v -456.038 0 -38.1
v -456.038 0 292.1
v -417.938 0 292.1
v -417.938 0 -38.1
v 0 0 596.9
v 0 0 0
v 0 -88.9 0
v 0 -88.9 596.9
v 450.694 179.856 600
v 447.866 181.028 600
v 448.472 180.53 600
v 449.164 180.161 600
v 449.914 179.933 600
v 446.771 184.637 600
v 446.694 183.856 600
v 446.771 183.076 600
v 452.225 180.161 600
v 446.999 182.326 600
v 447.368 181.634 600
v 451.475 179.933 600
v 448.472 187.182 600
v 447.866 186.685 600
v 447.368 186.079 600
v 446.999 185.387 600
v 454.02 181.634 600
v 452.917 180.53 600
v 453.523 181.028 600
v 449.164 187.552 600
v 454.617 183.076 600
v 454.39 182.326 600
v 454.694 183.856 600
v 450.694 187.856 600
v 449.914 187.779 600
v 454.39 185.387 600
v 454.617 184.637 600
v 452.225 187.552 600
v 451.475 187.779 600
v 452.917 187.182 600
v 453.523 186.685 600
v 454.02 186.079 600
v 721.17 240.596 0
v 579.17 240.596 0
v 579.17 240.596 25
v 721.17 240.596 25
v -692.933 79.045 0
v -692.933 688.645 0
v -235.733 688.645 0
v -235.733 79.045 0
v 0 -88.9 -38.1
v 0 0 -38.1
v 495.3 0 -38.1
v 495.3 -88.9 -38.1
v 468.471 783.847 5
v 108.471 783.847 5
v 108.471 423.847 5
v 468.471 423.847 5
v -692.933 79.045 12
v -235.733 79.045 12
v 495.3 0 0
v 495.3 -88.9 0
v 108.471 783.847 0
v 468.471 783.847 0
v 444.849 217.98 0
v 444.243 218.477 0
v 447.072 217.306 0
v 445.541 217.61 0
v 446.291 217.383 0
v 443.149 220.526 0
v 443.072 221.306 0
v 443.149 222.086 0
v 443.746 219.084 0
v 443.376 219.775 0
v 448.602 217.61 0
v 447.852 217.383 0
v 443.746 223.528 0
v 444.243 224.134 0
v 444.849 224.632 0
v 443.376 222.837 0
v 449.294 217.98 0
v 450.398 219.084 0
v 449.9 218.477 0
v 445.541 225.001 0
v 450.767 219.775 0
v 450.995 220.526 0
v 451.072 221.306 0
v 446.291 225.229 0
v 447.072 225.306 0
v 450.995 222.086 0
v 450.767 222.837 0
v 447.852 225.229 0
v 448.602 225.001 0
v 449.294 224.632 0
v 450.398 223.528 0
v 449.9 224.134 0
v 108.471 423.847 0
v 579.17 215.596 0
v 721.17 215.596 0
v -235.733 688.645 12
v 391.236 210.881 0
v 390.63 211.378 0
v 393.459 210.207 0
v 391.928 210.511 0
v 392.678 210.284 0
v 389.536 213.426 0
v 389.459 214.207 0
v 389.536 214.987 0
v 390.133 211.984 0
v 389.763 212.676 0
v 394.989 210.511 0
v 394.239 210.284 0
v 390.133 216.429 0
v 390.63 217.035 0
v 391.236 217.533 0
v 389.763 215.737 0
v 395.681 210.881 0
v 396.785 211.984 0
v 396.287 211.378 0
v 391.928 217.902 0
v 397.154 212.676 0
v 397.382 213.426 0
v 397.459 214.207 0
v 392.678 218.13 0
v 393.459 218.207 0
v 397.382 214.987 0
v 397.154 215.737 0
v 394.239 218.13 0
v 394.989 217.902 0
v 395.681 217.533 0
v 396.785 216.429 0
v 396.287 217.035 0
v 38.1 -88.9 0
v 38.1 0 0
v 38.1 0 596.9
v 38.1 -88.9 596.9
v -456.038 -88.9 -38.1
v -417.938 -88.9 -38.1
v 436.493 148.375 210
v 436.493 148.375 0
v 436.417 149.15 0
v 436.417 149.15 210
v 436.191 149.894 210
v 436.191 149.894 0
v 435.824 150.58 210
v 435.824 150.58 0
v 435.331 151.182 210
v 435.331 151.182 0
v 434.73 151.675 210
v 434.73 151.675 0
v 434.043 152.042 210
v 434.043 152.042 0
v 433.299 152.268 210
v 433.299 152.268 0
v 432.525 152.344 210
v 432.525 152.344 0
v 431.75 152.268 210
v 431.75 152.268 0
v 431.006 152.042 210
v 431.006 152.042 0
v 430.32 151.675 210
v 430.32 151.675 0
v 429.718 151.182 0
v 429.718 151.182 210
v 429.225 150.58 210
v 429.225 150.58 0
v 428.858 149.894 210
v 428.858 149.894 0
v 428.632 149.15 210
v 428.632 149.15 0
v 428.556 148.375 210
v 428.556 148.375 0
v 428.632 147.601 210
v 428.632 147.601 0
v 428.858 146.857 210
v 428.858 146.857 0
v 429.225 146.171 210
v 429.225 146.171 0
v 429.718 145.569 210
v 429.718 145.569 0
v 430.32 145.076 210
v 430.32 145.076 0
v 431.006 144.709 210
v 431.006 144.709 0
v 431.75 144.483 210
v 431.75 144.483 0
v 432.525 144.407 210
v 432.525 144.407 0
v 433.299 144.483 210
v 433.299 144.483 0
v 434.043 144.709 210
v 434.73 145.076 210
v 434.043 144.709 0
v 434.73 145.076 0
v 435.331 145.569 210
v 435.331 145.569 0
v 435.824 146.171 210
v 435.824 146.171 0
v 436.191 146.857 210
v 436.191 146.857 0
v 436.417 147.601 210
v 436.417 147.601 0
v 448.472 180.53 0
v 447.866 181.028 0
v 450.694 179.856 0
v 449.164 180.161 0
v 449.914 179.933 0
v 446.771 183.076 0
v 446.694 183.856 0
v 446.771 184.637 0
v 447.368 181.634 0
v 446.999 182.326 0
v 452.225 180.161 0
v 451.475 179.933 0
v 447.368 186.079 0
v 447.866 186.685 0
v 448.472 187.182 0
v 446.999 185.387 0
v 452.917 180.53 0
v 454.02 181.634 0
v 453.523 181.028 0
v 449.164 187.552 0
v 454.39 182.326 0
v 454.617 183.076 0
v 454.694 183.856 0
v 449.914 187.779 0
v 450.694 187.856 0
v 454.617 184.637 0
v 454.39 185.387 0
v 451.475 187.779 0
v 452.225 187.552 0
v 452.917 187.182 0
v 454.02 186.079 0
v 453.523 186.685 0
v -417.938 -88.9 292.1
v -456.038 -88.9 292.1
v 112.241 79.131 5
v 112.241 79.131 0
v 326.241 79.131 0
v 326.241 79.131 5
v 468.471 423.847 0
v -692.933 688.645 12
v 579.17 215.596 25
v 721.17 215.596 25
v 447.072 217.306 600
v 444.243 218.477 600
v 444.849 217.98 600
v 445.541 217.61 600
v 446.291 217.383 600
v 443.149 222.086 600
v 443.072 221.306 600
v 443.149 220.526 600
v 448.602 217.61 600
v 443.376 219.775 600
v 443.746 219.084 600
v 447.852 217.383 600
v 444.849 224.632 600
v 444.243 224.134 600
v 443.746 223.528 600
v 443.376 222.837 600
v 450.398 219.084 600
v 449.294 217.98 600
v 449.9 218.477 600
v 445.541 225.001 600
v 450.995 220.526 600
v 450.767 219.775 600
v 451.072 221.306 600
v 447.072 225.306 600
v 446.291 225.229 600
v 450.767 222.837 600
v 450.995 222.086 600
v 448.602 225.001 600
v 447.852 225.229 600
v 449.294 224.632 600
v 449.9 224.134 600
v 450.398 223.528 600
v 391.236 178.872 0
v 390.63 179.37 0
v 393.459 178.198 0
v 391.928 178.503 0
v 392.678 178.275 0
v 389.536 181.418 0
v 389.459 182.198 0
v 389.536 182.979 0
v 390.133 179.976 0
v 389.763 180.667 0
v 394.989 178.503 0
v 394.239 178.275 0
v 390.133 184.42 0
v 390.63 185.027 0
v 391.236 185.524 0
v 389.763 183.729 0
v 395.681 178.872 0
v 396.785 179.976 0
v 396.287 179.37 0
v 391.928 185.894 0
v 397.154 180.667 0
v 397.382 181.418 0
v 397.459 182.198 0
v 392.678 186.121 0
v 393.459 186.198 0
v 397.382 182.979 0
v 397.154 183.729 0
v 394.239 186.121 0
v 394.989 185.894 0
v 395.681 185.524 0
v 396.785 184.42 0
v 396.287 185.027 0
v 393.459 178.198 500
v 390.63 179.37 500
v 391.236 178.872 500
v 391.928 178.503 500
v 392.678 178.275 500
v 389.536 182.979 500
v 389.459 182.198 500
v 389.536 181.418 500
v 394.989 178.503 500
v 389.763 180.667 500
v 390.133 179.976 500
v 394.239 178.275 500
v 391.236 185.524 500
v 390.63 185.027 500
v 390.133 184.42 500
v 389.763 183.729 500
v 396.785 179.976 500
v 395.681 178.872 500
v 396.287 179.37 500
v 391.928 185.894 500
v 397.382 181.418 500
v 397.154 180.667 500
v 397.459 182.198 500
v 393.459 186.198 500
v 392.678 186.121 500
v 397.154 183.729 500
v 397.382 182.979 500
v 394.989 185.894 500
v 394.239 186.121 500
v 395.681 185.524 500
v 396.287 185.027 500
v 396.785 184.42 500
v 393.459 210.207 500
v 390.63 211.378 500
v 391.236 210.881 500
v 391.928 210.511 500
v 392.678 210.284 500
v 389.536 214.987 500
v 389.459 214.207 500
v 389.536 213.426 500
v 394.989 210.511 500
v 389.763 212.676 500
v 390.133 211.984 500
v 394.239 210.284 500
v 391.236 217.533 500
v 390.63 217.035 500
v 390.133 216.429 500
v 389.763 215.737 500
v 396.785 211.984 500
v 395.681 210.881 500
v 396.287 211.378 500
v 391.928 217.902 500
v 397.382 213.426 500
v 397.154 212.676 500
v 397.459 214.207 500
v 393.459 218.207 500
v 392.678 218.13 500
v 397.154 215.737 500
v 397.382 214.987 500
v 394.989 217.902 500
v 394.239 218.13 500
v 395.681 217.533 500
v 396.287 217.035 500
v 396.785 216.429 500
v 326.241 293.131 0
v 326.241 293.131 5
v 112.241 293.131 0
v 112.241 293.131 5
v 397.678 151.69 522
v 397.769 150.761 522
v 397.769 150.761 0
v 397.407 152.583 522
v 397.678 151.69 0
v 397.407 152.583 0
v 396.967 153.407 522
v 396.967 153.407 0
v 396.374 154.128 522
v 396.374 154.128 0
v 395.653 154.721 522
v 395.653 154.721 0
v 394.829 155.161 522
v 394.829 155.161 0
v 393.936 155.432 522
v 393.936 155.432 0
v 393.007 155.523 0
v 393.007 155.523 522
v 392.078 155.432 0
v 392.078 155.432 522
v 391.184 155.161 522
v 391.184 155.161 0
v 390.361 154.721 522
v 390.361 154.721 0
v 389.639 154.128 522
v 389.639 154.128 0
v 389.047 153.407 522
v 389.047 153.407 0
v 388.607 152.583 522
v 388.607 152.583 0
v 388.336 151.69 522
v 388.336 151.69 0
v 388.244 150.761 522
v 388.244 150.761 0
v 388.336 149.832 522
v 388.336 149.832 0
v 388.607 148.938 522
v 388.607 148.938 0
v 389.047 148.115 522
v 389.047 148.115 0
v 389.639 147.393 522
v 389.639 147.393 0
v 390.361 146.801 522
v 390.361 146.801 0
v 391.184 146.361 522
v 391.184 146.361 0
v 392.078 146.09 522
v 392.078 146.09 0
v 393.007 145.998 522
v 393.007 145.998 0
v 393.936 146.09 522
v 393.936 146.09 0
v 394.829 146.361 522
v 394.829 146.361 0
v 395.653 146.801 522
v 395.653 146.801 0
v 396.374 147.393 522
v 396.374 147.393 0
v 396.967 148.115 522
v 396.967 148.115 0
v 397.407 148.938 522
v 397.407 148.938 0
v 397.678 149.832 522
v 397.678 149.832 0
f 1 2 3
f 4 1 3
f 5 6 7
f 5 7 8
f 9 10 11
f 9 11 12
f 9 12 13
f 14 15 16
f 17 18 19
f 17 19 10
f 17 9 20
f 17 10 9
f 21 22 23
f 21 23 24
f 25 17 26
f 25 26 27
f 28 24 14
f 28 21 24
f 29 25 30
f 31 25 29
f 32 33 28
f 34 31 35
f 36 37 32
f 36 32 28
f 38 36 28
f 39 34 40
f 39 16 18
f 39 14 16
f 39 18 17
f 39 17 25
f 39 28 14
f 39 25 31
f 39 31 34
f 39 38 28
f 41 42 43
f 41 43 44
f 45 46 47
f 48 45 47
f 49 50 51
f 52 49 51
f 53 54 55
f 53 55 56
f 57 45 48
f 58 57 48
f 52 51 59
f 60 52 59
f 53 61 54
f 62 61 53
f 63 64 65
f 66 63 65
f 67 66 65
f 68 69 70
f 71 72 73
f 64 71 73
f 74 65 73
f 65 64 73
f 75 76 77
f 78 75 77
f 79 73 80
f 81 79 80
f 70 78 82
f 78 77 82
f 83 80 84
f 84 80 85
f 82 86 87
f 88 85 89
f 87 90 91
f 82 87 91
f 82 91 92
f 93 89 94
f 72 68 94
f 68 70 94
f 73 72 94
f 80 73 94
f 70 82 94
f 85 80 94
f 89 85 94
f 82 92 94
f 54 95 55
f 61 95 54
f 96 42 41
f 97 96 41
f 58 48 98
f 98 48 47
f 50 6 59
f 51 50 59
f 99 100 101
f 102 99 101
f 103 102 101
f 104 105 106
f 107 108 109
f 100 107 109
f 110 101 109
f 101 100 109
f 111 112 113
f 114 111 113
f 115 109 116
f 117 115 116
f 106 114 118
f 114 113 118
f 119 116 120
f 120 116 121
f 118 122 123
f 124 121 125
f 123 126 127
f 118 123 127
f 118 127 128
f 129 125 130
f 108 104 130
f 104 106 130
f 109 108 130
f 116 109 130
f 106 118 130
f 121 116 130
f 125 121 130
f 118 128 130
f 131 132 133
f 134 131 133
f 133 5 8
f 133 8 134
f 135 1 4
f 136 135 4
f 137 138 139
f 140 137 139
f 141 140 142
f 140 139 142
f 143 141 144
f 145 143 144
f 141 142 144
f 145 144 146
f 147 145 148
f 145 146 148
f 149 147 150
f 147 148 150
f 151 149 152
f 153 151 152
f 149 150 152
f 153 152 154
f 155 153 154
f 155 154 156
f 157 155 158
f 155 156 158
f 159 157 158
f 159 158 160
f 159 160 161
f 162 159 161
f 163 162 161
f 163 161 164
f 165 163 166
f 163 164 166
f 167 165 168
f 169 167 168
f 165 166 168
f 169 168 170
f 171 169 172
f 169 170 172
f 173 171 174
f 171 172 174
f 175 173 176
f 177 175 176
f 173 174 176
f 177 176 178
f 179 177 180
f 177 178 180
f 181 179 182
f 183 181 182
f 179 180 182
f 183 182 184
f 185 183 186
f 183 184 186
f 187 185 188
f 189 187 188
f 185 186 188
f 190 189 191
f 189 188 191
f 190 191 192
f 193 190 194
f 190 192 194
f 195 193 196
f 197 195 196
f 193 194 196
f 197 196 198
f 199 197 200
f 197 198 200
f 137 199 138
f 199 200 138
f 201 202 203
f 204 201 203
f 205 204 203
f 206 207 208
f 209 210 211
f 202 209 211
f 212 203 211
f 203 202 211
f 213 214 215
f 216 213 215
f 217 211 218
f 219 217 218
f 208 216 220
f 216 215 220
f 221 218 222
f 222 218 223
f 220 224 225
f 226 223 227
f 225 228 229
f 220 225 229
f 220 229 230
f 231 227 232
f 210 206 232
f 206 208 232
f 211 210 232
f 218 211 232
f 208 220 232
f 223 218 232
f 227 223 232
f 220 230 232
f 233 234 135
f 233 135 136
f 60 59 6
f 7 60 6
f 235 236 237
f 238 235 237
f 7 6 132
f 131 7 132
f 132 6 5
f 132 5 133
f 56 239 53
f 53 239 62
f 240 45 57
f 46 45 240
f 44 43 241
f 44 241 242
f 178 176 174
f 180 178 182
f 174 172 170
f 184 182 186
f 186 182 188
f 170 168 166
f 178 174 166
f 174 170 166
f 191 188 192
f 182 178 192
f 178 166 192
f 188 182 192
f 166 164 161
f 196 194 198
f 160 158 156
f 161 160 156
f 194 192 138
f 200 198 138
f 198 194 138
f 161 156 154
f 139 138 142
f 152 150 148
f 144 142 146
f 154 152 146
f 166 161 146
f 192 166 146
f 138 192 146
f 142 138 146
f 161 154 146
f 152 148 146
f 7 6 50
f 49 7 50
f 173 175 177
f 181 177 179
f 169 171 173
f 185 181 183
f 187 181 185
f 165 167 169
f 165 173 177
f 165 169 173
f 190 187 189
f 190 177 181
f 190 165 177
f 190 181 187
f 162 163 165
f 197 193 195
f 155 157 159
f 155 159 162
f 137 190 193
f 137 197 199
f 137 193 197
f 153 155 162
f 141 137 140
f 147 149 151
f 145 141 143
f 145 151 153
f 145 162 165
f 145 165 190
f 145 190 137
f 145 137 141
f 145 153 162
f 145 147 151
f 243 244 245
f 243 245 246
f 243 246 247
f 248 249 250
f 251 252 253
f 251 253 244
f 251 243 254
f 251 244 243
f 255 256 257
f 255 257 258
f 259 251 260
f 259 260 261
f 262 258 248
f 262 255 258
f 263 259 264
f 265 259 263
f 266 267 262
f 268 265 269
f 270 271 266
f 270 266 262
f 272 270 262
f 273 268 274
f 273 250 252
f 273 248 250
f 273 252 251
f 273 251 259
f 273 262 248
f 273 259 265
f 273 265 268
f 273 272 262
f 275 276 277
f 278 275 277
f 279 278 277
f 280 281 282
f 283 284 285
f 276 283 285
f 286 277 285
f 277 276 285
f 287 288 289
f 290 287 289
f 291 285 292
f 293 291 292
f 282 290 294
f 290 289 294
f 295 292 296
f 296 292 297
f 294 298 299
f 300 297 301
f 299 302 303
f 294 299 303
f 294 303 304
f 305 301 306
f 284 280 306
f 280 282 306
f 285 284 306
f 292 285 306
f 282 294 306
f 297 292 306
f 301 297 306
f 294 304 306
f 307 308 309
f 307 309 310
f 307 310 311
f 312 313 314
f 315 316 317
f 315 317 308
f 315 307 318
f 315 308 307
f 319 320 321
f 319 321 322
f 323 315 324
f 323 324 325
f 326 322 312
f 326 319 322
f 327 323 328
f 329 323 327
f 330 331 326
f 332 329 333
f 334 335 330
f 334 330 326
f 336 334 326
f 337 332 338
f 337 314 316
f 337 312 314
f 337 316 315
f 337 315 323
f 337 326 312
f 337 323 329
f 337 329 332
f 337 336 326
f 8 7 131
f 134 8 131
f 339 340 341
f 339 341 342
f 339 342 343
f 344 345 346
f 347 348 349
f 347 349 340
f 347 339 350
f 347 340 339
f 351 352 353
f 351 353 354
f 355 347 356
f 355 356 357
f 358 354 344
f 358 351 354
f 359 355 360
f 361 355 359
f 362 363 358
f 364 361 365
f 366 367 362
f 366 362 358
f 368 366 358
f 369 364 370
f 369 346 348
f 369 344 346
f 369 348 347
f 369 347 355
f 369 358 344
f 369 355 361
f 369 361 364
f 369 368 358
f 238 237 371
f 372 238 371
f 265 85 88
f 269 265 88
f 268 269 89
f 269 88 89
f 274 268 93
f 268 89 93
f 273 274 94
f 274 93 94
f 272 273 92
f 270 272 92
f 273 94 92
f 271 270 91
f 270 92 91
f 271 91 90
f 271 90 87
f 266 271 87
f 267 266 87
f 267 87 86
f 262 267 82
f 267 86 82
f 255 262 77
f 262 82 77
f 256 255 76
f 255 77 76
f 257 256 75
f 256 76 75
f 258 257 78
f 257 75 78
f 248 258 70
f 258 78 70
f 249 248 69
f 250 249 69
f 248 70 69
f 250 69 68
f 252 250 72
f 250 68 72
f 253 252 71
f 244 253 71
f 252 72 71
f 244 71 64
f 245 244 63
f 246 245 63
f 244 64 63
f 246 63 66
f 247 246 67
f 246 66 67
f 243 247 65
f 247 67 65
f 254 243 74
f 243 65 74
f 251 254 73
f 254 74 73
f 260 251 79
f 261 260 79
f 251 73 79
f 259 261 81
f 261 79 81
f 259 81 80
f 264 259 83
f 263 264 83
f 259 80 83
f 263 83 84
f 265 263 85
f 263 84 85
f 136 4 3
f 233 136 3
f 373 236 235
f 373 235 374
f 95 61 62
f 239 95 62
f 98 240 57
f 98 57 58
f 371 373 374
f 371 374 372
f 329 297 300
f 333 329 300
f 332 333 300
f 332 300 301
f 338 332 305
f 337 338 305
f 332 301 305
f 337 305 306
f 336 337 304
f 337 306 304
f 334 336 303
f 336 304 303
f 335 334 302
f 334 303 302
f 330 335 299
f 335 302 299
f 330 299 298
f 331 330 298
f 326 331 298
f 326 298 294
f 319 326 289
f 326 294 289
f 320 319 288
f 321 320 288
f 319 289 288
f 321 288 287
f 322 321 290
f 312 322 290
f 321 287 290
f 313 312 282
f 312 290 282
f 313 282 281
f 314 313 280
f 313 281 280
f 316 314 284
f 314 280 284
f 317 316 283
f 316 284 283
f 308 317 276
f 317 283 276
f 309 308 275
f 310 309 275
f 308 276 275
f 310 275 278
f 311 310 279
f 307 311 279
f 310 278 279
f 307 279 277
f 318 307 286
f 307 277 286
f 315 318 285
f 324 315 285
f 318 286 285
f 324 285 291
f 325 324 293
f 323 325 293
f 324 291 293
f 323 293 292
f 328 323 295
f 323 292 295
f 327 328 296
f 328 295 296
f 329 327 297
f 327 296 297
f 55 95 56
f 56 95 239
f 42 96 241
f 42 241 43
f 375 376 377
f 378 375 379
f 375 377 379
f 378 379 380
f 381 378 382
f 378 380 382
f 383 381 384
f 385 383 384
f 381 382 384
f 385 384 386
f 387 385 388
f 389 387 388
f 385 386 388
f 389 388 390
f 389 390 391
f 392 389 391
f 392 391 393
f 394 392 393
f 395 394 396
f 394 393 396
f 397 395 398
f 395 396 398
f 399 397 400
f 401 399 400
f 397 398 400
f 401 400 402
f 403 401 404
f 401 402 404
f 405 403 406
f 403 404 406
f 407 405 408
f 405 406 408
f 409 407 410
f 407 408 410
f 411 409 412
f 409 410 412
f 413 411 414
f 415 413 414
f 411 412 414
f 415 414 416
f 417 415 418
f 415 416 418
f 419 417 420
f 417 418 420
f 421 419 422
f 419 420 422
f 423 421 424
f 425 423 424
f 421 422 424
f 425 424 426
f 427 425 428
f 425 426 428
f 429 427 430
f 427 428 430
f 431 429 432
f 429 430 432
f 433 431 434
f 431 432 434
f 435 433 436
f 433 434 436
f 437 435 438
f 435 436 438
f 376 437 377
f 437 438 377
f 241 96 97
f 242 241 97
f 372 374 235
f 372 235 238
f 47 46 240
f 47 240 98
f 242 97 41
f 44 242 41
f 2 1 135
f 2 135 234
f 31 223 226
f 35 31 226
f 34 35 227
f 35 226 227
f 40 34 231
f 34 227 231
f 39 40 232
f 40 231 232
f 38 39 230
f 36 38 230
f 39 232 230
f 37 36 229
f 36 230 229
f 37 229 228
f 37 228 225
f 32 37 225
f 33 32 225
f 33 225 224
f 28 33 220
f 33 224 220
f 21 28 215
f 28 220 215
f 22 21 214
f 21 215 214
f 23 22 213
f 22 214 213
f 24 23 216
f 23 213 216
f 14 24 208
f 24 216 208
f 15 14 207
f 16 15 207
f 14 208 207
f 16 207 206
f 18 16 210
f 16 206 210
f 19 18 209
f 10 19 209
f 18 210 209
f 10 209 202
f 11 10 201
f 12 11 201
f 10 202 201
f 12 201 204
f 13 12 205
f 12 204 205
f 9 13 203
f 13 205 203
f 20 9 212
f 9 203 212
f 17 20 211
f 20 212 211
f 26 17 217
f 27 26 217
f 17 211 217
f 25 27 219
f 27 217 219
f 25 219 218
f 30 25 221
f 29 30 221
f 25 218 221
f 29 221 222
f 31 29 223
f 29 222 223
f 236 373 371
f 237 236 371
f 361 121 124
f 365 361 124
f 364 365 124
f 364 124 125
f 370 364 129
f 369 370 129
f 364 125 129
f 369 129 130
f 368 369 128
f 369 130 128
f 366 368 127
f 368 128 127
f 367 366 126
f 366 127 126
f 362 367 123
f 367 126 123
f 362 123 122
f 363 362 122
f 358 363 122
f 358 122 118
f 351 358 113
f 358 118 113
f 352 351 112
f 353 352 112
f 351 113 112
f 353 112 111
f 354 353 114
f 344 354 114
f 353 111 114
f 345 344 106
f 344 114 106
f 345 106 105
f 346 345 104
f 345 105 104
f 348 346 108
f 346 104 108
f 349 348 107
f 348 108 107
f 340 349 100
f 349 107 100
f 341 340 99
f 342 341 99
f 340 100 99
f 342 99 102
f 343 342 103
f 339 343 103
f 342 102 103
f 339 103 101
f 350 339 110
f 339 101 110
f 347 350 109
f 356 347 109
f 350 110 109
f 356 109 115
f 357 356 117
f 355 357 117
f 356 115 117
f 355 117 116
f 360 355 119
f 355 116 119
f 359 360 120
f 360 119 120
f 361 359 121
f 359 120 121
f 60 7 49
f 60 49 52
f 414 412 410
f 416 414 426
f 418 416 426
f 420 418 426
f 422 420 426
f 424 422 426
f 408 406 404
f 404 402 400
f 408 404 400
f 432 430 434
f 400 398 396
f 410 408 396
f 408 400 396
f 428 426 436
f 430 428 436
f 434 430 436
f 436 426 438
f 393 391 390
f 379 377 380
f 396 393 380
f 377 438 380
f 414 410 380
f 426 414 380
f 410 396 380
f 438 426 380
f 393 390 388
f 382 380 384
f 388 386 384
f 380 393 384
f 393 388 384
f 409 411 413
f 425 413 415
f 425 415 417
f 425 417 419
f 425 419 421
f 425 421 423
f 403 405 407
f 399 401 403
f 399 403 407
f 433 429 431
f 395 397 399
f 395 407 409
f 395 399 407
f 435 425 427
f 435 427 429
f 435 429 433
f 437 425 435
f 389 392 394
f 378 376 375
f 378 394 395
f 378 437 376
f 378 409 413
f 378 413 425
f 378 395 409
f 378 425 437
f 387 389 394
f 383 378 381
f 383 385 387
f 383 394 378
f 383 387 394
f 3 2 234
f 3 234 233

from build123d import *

# Parameters (mm, degrees)
F0_W      = 38.1
F0_H      = 596.9
F1_DEPTH  = 88.9
F2_DEPTH  = 88.9
F3_W      = 214
F3_H      = 214
F4_DEPTH  = 5
F3_R      = 4
F5_DEPTH  = 500
F6_DEPTH  = 500
F3_W_2    = 360
F3_H_2    = 360
F7_DEPTH  = 5
F3_R_2    = 4.7625
F8_DEPTH  = 522
F9_DEPTH  = 600
F3_R_3    = 3.96875
F10_DEPTH = 210
F11_DEPTH = 600
F3_W_3    = 457.2
F3_H_3    = 609.6
F12_DEPTH = 12
F3_W_4    = 142
F3_H_4    = 25
F13_DEPTH = 25
F0_H_2    = 330.2
F14_DEPTH = 88.9


with BuildPart() as f1:
    # F0 (on Front) → F1 (new body)
    with BuildSketch(Plane.XZ):
        with Locations((19.05, 298.45)):
            Rectangle(F0_W, F0_H)
    extrude(amount=F1_DEPTH)


with BuildPart() as f2:
    # F0 (on Front) → F2 (new body)
    with BuildSketch(Plane.XZ):
        Polygon((38.1, 0), (0, 0), (0, -38.1), (495.3, -38.1), (495.3, 0), align=None)
    extrude(amount=F2_DEPTH)


with BuildPart() as f4:
    # F3 (on Top) → F4 (new body)
    with BuildSketch(Plane.XY):
        with Locations((219.240808, 186.130732)):
            Rectangle(F3_W, F3_H)
    extrude(amount=F4_DEPTH)


with BuildPart() as f5:
    # F3 (on Top) → F5 (new body)
    with BuildSketch(Plane.XY):
        with Locations((393.458724, 214.206696)):
            Circle(F3_R)
    extrude(amount=F5_DEPTH)


with BuildPart() as f6:
    # F3 (on Top) → F6 (new body)
    with BuildSketch(Plane.XY):
        with Locations((393.458724, 182.198182)):
            Circle(F3_R)
    extrude(amount=F6_DEPTH)


with BuildPart() as f7:
    # F3 (on Top) → F7 (new body)
    with BuildSketch(Plane.XY):
        with Locations((288.471088, 603.846811)):
            Rectangle(F3_W_2, F3_H_2)
    extrude(amount=F7_DEPTH)


with BuildPart() as f8:
    # F3 (on Top) → F8 (new body)
    with BuildSketch(Plane.XY):
        with Locations((393.006811, 150.760646)):
            Circle(F3_R_2)
    extrude(amount=F8_DEPTH)


with BuildPart() as f9:
    # F3 (on Top) → F9 (new body)
    with BuildSketch(Plane.XY):
        with Locations((450.694332, 183.856339)):
            Circle(F3_R)
    extrude(amount=F9_DEPTH)


with BuildPart() as f10:
    # F3 (on Top) → F10 (new body)
    with BuildSketch(Plane.XY):
        with Locations((432.52459, 148.375439)):
            Circle(F3_R_3)
    extrude(amount=F10_DEPTH)


with BuildPart() as f11:
    # F3 (on Top) → F11 (new body)
    with BuildSketch(Plane.XY):
        with Locations((447.071671, 221.305892)):
            Circle(F3_R)
    extrude(amount=F11_DEPTH)


with BuildPart() as f12:
    # F3 (on Top) → F12 (new body)
    with BuildSketch(Plane.XY):
        with Locations((-464.333202, 383.84502)):
            Rectangle(F3_W_3, F3_H_3)
    extrude(amount=F12_DEPTH)


with BuildPart() as f13:
    # F3 (on Top) → F13 (new body)
    with BuildSketch(Plane.XY):
        with Locations((650.169591, 228.096303)):
            Rectangle(F3_W_4, F3_H_4)
    extrude(amount=F13_DEPTH)


with BuildPart() as f14:
    # F0 (on Front) → F14 (new body)
    with BuildSketch(Plane.XZ):
        with Locations((-436.988028, 127)):
            Rectangle(F0_W, F0_H_2)
    extrude(amount=F14_DEPTH)


solid = Compound([f1.part, f2.part, f4.part, f5.part, f6.part, f7.part, f8.part, f9.part, f10.part, f11.part, f12.part, f13.part, f14.part])
